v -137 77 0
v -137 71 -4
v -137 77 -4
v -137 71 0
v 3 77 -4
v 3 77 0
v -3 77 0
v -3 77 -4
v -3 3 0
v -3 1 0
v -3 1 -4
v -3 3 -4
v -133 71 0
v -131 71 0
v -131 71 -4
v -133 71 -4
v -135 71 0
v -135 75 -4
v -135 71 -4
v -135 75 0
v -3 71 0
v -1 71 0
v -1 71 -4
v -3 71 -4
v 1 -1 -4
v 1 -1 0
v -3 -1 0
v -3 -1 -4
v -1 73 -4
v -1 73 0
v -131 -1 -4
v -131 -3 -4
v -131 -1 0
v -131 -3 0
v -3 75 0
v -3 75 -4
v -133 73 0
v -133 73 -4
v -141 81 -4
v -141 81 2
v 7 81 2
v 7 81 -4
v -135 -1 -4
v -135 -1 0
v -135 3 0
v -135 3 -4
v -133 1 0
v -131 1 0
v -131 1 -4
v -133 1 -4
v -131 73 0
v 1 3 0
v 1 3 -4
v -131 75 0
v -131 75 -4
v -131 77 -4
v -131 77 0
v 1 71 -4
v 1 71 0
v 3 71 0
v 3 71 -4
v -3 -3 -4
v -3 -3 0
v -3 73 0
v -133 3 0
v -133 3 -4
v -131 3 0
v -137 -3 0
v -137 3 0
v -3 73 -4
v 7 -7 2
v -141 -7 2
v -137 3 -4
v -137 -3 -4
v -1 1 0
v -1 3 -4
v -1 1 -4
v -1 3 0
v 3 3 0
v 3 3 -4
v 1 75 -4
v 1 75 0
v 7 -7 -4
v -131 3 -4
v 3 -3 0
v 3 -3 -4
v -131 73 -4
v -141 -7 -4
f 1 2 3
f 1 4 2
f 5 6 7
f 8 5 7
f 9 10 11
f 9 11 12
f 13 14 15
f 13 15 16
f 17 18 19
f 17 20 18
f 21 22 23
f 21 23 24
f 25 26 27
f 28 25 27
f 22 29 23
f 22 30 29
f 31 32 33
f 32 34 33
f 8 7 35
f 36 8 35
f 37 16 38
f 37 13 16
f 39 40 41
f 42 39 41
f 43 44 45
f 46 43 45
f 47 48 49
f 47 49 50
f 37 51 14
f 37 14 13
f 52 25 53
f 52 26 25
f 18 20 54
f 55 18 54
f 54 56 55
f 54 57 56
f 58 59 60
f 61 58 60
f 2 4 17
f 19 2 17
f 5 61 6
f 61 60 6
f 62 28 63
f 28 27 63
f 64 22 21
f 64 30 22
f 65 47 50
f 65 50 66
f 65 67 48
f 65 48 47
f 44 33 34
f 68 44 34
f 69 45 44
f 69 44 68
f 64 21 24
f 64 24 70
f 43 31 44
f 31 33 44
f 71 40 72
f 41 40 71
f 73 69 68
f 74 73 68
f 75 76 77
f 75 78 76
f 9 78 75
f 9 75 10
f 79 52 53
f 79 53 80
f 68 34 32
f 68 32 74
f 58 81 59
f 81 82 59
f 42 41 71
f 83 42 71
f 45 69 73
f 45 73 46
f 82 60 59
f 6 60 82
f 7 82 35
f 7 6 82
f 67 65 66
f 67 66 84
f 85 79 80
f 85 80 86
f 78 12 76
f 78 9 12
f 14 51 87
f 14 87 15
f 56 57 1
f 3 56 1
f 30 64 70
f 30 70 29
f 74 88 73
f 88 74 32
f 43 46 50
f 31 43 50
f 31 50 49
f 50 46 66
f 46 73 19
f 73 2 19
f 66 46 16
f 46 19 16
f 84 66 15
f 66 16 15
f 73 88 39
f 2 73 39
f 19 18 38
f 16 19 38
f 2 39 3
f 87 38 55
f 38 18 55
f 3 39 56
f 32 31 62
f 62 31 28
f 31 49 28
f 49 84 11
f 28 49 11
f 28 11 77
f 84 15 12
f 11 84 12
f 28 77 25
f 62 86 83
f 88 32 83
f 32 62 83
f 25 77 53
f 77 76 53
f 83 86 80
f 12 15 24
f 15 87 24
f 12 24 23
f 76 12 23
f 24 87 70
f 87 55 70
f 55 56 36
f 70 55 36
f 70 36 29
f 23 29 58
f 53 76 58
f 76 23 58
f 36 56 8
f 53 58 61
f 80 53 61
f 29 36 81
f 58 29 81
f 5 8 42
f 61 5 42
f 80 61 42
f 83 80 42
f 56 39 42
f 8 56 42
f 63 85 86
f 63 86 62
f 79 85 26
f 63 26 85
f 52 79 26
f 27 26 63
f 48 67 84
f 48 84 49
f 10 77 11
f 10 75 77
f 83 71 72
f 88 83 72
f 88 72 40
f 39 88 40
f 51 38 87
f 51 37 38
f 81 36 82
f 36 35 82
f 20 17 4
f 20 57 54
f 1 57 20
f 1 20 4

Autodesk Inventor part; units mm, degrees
ref_plane "YZ Plane" through (0, 0, 0) normal (1, 0, 0) x (0, 1, 0)
ref_plane "XZ Plane" through (0, 0, 0) normal (0, 1, 0) x (-1, 0, 0)
ref_plane "XY Plane" through (0, 0, 0) normal (0, 0, 1) x (1, 0, 0)
sketch "Sketch1" plane through (0, 0, 0) normal (0, 0, 1) x (1, 0, 0)
  circle A0 centre (-107, 60.0196) radius 2 construction
  circle A1 centre (-27, 60.0196) radius 2 construction
  line L0 (-133, 1) -> (-133, 3) construction
  line L1 (-133, 3) -> (-131, 3) construction
  line L2 (-131, 3) -> (-131, 1) construction
  line L3 (-131, 1) -> (-133, 1) construction
  line L4 (-1, 3) -> (-1, 1) construction
  line L5 (-1, 1) -> (-3, 1) construction
  line L6 (-3, 1) -> (-3, 3) construction
  line L7 (-3, 3) -> (-1, 3) construction
  line L8 (-3, 73) -> (-1, 73) construction
  line L9 (-1, 73) -> (-1, 71) construction
  line L10 (-1, 71) -> (-3, 71) construction
  line L11 (-3, 71) -> (-3, 73) construction
  line L12 (-131, 71) -> (-133, 71) construction
  line L13 (-133, 71) -> (-133, 73) construction
  line L14 (-133, 73) -> (-131, 73) construction
  line L15 (-131, 73) -> (-131, 71) construction
  line L16 (-3, -3) -> (-3, -1) construction
  line L17 (-3, -1) -> (1, -1) construction
  line L18 (1, -1) -> (1, 3) construction
  line L19 (1, 3) -> (3, 3) construction
  line L20 (3, 3) -> (3, 71) construction
  line L21 (3, 71) -> (1, 71) construction
  line L22 (1, 71) -> (1, 75) construction
  line L23 (1, 75) -> (-3, 75) construction
  line L24 (-3, 75) -> (-3, 77) construction
  line L25 (-3, 77) -> (-131, 77) construction
  line L26 (-131, 77) -> (-131, 75) construction
  line L27 (-131, 75) -> (-135, 75) construction
  line L28 (-135, 75) -> (-135, 71) construction
  line L29 (-135, 71) -> (-137, 71) construction
  line L30 (-137, 71) -> (-137, 3) construction
  line L31 (-137, 3) -> (-135, 3) construction
  line L32 (-135, 3) -> (-135, -1) construction
  line L33 (-135, -1) -> (-131, -1) construction
  line L34 (-131, -1) -> (-131, -3) construction
  line L35 (-131, -3) -> (-3, -3) construction
  line L36 (-137, 3) -> (-137, -3) construction
  line L37 (-137, 77) -> (-137, 71) construction
  line L38 (3, -3) -> (-137, -3) construction
  line L39 (-137, -3) -> (-137, 77) construction
  line L40 (-137, 77) -> (3, 77) construction
  line L41 (3, 77) -> (3, -3) construction
  line L42 (7, -7) -> (-141, -7)
  line L43 (-141, -7) -> (-141, 81)
  line L44 (-141, 81) -> (7, 81)
  line L45 (7, 81) -> (7, -7)
  line L46 (3, -3) -> (-3, -3)
  line L47 (-3, -1) -> (-3, -3)
  line L48 (1, -1) -> (1, 3)
  line L49 (3, 3) -> (3, -3)
  line L50 (1, 3) -> (3, 3)
  line L51 (1, -1) -> (-3, -1)
  line L52 (1, 71) -> (3, 71)
  line L53 (3, 71) -> (3, 77)
  line L54 (-3, 77) -> (-3, 75)
  line L55 (1, 75) -> (1, 71)
  line L56 (3, 77) -> (-3, 77)
  line L57 (-3, 75) -> (1, 75)
  line L58 (-131, 77) -> (-131, 75)
  line L59 (-135, 75) -> (-135, 71)
  line L60 (-137, 71) -> (-137, 77)
  line L61 (-131, 77) -> (-137, 77)
  line L62 (-137, 71) -> (-135, 71)
  line L63 (-135, 75) -> (-131, 75)
  line L64 (-131, -3) -> (-131, -1)
  line L65 (-135, -1) -> (-135, 3)
  line L66 (-137, 3) -> (-137, -3)
  line L67 (-131, -3) -> (-137, -3)
  line L68 (-131, -1) -> (-135, -1)
  line L69 (-137, 3) -> (-135, 3)
  line L70 (-1, 1) -> (-3, 1)
  line L71 (-3, 1) -> (-3, 3)
  line L72 (-3, 3) -> (-1, 3)
  line L73 (-1, 3) -> (-1, 1)
  line L74 (-1, 71) -> (-3, 71)
  line L75 (-3, 71) -> (-3, 73)
  line L76 (-3, 73) -> (-1, 73)
  line L77 (-1, 73) -> (-1, 71)
  line L78 (-131, 71) -> (-133, 71)
  line L79 (-133, 71) -> (-133, 73)
  line L80 (-133, 73) -> (-131, 73)
  line L81 (-131, 73) -> (-131, 71)
  line L82 (-131, 1) -> (-133, 1)
  line L83 (-133, 1) -> (-133, 3)
  line L84 (-133, 3) -> (-131, 3)
  line L85 (-131, 3) -> (-131, 1)
  point P0 (0, 0)
  dimension "d0" = 4
extrude "Extrusion1" add sketch "Sketch1" against normal blind 4
sketch "Sketch2" plane through (-141, 81, 0) normal (0, 1, 0) x (1, 0, 0)
  line L0 (148, 0) -> (148, 4) projected
  line L1 (148, 0) -> (0, 0)
  line L2 (0, 0) -> (0, -2)
  line L3 (0, -2) -> (148, -2)
  line L4 (148, -2) -> (148, 0)
  point P0 (141, 0)
  dimension "d3" = 2
extrude "Extrusion2" add sketch "Sketch2" against normal up to surface (88 mm away)
properties part number "NL_hosuing_Top"
